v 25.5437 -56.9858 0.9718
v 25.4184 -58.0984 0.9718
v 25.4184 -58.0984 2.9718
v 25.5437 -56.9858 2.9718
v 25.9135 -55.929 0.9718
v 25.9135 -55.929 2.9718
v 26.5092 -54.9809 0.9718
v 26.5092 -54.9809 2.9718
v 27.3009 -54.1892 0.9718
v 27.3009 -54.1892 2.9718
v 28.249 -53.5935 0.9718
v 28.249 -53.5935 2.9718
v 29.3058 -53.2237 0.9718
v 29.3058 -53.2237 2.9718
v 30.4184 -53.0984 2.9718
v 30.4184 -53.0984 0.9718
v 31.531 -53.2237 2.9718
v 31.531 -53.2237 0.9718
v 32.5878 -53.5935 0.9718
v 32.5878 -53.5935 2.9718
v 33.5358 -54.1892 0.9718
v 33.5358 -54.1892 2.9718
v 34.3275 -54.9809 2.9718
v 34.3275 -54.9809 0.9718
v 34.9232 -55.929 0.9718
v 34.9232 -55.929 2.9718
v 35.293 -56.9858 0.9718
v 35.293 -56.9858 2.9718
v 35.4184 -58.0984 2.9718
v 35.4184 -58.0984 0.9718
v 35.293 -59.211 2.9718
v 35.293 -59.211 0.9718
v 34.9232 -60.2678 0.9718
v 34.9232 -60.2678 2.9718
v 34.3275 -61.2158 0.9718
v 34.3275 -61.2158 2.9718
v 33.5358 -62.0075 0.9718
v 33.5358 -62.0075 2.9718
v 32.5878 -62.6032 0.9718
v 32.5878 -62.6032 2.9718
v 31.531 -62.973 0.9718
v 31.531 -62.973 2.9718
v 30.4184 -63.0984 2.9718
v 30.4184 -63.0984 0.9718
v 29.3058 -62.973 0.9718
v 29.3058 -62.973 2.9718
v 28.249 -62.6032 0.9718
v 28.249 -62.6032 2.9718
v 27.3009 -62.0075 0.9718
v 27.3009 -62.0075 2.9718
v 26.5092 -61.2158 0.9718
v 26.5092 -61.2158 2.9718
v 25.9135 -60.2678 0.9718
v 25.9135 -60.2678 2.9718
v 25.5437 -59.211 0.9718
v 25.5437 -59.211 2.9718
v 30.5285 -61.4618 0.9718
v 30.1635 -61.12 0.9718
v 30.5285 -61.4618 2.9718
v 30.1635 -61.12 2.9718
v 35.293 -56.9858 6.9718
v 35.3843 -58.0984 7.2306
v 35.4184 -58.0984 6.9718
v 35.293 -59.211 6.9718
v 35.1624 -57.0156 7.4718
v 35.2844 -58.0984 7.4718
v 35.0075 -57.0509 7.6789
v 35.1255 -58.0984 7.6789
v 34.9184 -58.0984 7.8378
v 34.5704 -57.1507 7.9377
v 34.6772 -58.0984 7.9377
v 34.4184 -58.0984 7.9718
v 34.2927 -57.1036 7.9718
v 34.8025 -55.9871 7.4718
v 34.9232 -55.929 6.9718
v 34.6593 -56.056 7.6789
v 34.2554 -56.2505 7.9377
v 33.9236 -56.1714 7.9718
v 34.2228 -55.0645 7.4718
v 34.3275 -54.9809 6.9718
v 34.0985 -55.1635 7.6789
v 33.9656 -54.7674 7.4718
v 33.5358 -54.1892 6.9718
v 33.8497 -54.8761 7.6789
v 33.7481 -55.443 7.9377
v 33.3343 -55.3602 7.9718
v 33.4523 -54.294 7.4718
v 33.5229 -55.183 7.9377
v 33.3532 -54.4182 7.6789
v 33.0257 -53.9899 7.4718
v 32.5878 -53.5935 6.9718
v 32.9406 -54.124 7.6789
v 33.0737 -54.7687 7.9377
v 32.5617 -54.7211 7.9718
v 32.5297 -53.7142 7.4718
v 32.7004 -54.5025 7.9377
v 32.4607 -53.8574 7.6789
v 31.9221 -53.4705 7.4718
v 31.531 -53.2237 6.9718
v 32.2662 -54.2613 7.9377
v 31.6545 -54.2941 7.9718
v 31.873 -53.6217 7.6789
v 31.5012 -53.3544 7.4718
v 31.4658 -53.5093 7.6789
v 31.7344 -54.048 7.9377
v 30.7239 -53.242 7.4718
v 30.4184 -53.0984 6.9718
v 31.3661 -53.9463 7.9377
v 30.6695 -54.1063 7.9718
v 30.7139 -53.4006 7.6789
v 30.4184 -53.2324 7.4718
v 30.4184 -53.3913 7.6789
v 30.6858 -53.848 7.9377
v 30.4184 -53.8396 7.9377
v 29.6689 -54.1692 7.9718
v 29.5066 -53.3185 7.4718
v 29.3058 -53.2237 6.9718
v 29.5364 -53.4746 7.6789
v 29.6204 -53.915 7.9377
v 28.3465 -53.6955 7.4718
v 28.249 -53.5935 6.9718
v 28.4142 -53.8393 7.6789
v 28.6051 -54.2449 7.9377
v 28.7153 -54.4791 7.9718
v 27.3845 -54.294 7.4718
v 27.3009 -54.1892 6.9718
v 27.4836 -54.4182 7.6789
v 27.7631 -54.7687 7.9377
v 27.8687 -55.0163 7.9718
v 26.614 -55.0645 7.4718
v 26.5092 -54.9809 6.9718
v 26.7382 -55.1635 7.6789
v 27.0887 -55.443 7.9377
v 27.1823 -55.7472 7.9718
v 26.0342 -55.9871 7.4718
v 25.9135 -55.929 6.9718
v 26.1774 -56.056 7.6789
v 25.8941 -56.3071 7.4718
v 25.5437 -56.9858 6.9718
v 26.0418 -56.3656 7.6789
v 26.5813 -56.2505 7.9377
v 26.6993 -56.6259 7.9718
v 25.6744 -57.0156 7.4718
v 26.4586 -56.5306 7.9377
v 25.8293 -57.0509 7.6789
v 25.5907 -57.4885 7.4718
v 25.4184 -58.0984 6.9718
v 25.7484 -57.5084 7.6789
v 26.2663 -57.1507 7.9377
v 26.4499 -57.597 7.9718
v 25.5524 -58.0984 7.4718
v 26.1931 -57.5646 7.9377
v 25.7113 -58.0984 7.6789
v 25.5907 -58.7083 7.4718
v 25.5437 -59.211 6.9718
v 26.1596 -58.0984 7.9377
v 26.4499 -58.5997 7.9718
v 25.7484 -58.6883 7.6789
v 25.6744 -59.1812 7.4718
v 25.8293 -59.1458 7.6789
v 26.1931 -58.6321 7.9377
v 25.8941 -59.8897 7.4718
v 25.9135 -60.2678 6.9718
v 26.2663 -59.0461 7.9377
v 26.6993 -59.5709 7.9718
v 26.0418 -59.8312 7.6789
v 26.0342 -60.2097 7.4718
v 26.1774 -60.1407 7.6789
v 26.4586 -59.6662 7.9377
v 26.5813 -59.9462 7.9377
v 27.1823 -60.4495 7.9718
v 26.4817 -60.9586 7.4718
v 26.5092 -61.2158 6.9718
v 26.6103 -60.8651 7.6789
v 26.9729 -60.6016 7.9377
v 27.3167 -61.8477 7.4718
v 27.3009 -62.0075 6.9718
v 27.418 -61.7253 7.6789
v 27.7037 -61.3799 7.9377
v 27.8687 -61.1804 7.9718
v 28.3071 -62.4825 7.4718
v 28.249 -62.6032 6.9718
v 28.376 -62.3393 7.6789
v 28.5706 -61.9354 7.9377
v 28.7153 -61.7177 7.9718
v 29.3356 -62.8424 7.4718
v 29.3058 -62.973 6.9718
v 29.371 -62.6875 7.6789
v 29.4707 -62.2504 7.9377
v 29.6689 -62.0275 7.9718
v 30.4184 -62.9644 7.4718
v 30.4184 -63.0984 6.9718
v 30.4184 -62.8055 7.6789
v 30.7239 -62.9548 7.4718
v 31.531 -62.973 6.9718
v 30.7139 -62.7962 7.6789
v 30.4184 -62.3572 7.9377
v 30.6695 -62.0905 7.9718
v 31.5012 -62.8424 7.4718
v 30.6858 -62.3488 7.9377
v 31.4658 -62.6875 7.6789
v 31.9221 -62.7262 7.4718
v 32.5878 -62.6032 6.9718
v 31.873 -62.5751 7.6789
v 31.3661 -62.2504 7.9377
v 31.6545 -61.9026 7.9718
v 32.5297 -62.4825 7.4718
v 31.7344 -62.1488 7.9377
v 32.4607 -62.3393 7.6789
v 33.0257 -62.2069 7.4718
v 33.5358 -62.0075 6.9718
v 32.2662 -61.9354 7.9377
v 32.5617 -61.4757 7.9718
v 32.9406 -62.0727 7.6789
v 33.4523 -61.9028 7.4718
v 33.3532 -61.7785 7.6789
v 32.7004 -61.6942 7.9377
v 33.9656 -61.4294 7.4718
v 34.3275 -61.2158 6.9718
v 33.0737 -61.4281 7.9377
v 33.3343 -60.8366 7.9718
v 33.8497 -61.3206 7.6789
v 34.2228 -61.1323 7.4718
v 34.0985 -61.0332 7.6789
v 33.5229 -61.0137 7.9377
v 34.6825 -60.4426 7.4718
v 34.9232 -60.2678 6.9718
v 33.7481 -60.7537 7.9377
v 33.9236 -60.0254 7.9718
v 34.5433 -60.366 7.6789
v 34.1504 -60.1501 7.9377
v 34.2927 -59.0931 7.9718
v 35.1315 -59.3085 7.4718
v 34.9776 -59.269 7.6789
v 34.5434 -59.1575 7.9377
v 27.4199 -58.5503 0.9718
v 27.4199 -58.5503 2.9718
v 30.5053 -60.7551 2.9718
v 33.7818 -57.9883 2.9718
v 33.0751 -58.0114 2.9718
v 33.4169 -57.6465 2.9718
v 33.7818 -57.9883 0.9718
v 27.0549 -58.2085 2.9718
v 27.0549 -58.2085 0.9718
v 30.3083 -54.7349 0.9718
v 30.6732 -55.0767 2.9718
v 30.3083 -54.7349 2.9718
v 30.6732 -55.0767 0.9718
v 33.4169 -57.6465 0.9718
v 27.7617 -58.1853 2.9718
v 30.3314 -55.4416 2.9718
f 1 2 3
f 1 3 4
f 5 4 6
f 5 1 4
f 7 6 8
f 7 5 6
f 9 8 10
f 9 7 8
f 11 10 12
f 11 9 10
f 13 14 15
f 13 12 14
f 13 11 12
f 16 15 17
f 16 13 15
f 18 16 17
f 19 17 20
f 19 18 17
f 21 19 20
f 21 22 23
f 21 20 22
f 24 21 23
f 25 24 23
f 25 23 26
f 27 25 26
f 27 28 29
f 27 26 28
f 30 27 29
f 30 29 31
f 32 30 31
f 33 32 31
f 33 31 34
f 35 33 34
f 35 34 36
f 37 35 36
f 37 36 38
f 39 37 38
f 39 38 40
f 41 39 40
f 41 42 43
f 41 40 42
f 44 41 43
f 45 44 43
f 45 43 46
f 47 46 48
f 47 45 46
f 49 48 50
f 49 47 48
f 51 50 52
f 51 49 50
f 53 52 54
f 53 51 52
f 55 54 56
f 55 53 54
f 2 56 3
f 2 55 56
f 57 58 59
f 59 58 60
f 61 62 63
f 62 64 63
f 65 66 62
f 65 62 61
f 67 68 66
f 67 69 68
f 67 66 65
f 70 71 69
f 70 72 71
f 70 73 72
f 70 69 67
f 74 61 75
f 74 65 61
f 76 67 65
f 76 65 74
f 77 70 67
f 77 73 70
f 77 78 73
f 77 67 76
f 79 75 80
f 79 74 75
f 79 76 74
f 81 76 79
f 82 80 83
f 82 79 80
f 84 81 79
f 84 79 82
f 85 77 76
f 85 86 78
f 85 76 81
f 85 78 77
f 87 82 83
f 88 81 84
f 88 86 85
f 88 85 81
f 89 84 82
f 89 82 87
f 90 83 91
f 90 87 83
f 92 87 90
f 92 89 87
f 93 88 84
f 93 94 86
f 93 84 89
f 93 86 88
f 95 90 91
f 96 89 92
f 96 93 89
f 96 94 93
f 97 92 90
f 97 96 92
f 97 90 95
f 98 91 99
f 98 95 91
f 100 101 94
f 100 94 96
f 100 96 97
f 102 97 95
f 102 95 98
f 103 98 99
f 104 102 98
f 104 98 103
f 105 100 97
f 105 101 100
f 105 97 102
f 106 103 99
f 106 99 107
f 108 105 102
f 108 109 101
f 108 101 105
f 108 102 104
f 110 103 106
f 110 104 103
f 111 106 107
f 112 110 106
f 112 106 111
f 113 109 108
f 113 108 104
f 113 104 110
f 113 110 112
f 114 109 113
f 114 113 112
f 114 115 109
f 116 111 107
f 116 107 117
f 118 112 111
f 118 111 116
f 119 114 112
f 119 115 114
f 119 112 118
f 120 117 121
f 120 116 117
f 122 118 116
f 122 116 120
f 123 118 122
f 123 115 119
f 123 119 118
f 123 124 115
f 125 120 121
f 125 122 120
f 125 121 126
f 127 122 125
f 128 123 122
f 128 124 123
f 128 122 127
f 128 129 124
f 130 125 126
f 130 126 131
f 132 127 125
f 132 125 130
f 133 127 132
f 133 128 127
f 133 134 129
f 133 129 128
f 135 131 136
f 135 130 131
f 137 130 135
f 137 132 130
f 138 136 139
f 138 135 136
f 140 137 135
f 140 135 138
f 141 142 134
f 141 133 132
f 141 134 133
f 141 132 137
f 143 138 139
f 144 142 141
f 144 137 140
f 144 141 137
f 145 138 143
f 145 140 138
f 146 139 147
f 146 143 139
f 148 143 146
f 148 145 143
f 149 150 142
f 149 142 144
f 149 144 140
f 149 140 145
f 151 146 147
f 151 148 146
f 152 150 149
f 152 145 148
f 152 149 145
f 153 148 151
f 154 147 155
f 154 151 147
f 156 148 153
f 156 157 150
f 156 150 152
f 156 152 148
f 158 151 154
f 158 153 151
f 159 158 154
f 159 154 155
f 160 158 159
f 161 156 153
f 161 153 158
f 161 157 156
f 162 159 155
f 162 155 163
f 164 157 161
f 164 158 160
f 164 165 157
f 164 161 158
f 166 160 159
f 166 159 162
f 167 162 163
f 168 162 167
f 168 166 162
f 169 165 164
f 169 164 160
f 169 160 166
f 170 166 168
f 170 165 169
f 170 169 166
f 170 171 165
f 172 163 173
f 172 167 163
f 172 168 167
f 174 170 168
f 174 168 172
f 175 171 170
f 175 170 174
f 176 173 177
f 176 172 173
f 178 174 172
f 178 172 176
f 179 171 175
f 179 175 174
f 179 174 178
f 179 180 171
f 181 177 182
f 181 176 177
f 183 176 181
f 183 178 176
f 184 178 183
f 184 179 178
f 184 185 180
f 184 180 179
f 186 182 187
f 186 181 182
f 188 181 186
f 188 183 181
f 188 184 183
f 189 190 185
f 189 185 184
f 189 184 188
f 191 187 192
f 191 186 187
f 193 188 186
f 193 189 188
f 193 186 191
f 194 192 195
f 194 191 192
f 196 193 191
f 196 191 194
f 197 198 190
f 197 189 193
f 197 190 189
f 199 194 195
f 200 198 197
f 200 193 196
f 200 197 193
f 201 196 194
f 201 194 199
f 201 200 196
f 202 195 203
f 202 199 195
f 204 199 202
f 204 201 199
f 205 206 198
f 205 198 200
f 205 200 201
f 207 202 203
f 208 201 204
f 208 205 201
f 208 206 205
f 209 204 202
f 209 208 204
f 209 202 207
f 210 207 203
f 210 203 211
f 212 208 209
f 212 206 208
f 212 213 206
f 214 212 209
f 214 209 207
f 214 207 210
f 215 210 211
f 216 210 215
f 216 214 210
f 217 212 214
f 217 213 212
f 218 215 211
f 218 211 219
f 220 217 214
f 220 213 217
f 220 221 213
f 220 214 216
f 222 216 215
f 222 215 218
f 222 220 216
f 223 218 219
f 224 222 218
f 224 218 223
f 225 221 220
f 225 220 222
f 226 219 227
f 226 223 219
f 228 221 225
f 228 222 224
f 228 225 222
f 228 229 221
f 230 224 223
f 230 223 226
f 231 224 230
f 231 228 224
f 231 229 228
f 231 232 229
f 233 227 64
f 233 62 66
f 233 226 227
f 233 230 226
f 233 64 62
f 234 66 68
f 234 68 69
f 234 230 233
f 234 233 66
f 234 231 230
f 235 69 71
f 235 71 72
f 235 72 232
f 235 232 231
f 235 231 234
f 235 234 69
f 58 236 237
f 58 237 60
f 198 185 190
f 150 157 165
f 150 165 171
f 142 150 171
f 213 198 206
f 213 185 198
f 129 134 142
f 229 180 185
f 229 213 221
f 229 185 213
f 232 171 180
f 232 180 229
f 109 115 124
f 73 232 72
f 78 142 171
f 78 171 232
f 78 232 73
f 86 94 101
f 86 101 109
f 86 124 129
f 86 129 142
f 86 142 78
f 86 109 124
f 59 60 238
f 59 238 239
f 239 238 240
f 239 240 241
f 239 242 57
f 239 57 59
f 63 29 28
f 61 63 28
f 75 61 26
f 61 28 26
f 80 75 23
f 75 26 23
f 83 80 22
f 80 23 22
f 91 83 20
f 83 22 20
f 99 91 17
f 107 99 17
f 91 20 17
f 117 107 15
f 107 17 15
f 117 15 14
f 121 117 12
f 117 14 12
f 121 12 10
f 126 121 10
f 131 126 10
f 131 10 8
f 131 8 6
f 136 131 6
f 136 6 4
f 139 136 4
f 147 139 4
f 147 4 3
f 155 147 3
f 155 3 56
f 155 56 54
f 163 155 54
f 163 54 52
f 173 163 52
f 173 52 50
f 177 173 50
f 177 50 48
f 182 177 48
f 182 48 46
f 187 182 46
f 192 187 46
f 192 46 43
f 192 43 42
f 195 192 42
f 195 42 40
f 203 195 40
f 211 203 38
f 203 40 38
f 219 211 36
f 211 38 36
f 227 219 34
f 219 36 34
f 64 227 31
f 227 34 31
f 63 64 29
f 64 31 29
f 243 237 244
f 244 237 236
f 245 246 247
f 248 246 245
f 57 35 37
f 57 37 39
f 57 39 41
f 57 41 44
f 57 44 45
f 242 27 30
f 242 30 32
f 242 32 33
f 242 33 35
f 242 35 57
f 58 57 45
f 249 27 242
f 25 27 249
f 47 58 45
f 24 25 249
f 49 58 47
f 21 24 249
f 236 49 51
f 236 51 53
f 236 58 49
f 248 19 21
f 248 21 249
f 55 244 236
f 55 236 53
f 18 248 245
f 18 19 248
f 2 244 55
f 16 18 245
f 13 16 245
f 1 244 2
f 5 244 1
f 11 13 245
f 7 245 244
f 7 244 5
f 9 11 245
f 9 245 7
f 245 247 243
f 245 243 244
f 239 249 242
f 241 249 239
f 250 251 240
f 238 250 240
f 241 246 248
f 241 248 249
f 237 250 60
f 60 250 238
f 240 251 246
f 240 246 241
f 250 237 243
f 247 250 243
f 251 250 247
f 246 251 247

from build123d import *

# Parameters (mm, degrees)
SKETCH3_R           = 5
BOSS_EXTRUDE2_DEPTH = 5
BOSS_EXTRUDE3_START = 2
SKETCH4_R           = 5
BOSS_EXTRUDE3_DEPTH = 2
SKETCH5_W           = 3.7592
SKETCH5_H           = 2
CUT_EXTRUDE2_DEPTH  = 0.5
SKETCH6_W           = 3.7592
SKETCH6_H           = 2
CUT_EXTRUDE3_DEPTH  = 0.5
SKETCH7_W           = 2
SKETCH7_H           = 4.7592
CUT_EXTRUDE4_DEPTH  = 0.5
SKETCH8_W           = 2
SKETCH8_H           = 4.7592
CUT_EXTRUDE5_DEPTH  = 0.5
FILLET1_R           = 1


with BuildPart() as part:
    # Sketch3 → Boss-Extrude2 (new body)
    with BuildSketch(Plane.XY.offset(2.9718)):
        with Locations((30.41838411, -58.09837557)):
            Circle(SKETCH3_R)
    extrude(amount=BOSS_EXTRUDE2_DEPTH)

    # Sketch4 → Boss-Extrude3 (add)
    with BuildSketch(Plane(origin=(0, 0, 2.9718), x_dir=(-1, 0, 0), z_dir=(0, 0, -1)).offset(BOSS_EXTRUDE3_START)):
        with Locations((-30.41838411, -58.09837557)):
            Circle(SKETCH4_R)
        Polygon((-30.505343509, -60.755108598), (-33.075117138, -58.011416171), (-30.331424712, -55.441642541), (-27.761651082, -58.185334968), align=None, mode=Mode.SUBTRACT)
    extrude(amount=-BOSS_EXTRUDE3_DEPTH)

    # Sketch5 → Cut-Extrude2 (cut)
    with BuildSketch(Plane(origin=(-13.487510975, -14.400327439, 0), x_dir=(0.7298607220838652, -0.6835958794194263, 0), z_dir=(-0.6835958794194263, -0.7298607220838652, 0))):
        with Locations((61.916993932, 1.9718)):
            Rectangle(SKETCH5_W, SKETCH5_H)
    extrude(amount=-CUT_EXTRUDE2_DEPTH, mode=Mode.SUBTRACT)

    # Sketch6 → Cut-Extrude3 (cut)
    with BuildSketch(Plane(origin=(-16.057284605, -17.144019865, 0), x_dir=(0.7298607220838642, -0.6835958794194275, 0), z_dir=(0.6835958794194275, 0.7298607220838642, 0))):
        with Locations((61.916993932, -1.9718)):
            Rectangle(SKETCH6_W, SKETCH6_H)
    extrude(amount=-CUT_EXTRUDE3_DEPTH, mode=Mode.SUBTRACT)

    # Sketch7 → Cut-Extrude4 (cut)
    with BuildSketch(Plane(origin=(43.818935687, -41.041315103, 0), x_dir=(0, 0, -1), z_dir=(0.7298607220838652, -0.6835958794194263, 0))):
        with Locations((-1.9718, -21.609840309)):
            Rectangle(SKETCH7_W, SKETCH7_H)
    extrude(amount=-CUT_EXTRUDE4_DEPTH, mode=Mode.SUBTRACT)

    # Sketch8 → Cut-Extrude5 (cut)
    with BuildSketch(Plane(origin=(46.562628114, -43.611088733, 0), x_dir=(0, 0, 1), z_dir=(-0.7298607220838662, 0.6835958794194253, 0))):
        with Locations((1.9718, -21.609840309)):
            Rectangle(SKETCH8_W, SKETCH8_H)
    extrude(amount=-CUT_EXTRUDE5_DEPTH, mode=Mode.SUBTRACT)

    # Fillet1
    fillet1_edges = [part.edges().sort_by_distance(p)[0] for p in [
        (25.41838411, -58.09837557, 7.9718),
    ]]
    fillet(fillet1_edges, radius=FILLET1_R)


solid = part.part
